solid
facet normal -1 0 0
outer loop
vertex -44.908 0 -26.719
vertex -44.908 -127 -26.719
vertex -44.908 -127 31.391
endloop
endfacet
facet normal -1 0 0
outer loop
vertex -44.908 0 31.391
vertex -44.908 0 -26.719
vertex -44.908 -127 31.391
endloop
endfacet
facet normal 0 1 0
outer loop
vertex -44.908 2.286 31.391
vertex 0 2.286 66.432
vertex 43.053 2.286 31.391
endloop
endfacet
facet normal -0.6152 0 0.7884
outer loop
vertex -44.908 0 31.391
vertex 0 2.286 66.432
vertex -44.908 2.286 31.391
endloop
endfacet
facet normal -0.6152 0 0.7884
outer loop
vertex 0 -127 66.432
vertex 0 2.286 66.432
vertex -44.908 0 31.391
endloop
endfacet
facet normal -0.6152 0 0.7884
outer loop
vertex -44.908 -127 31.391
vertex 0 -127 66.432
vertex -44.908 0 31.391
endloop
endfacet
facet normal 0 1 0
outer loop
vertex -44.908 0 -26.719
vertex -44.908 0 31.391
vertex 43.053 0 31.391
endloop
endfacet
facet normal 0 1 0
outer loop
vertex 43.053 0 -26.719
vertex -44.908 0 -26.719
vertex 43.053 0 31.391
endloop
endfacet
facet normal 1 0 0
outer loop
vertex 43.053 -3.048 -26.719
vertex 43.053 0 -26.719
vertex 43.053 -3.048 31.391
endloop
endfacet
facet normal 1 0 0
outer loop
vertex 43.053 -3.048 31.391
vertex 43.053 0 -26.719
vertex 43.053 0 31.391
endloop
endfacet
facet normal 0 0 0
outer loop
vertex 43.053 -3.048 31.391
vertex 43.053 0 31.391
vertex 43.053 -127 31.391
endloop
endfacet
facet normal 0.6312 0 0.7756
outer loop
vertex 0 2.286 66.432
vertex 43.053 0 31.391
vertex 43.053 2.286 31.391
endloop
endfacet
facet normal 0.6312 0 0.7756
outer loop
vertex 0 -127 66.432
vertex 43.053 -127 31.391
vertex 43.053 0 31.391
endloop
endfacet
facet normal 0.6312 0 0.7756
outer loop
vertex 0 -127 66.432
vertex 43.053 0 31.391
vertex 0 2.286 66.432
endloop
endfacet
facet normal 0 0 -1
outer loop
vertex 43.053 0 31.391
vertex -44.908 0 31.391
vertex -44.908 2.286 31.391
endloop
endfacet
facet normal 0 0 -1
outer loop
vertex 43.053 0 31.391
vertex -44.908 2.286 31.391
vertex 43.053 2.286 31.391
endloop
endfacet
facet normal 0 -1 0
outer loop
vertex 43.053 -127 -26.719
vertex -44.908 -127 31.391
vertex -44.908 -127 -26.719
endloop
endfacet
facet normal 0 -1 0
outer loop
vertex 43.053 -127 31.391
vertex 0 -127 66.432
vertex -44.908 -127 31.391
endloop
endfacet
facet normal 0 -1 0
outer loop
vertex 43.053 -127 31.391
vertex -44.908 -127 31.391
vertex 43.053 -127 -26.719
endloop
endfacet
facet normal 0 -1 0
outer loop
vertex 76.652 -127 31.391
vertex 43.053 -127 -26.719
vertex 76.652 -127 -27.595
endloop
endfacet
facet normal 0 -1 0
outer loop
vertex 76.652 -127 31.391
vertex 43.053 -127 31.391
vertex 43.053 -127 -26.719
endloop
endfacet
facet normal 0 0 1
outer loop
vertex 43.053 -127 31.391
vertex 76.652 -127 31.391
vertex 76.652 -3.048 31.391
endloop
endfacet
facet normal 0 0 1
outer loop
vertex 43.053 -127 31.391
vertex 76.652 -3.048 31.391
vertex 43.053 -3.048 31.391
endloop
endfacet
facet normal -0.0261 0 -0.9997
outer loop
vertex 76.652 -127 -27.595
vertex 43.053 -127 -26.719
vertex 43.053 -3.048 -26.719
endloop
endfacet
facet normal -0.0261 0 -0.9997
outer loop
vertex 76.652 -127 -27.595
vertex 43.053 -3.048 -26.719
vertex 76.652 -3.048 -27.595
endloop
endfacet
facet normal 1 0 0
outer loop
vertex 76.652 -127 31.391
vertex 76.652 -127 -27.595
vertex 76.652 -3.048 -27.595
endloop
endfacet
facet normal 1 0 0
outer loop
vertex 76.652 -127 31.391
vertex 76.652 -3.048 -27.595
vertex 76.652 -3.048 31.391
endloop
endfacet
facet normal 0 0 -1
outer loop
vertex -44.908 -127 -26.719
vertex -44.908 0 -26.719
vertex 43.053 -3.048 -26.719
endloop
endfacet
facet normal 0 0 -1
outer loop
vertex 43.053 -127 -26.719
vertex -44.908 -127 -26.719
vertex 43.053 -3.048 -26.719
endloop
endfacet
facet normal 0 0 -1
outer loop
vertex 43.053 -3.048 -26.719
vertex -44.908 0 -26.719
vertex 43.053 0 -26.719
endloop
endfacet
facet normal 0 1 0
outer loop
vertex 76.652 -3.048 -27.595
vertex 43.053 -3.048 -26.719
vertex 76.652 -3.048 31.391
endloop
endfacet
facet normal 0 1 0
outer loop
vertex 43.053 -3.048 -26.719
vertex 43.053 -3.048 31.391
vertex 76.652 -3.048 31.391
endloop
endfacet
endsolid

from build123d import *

# Parameters (mm, degrees)
F0_W     = 87.960623
F0_H     = 58.109455
F1_DEPTH = 127
F3_DEPTH = 129.286
F5_DEPTH = 123.952


with BuildPart() as f1:
    # F0 (on Front) → F1 (new body)
    with BuildSketch(Plane.XZ):
        with Locations((-0.927712, 2.336059)):
            Rectangle(F0_W, F0_H)
    extrude(amount=F1_DEPTH)

    # F2 (on face) → F3 (join)
    with BuildSketch(Plane.XZ.offset(127)):
        Polygon((0, 66.431664), (-44.908024, 31.390786), (43.052599, 31.390786), align=None)
    extrude(amount=-F3_DEPTH)

    # F4 (on face) → F5 (join)
    with BuildSketch(Plane.XZ.offset(127)):
        Polygon((76.651916, 31.390786), (43.052599, 31.390786), (43.052599, -26.718669), (76.651916, -27.594689), align=None)
    extrude(amount=-F5_DEPTH)


solid = f1.part
